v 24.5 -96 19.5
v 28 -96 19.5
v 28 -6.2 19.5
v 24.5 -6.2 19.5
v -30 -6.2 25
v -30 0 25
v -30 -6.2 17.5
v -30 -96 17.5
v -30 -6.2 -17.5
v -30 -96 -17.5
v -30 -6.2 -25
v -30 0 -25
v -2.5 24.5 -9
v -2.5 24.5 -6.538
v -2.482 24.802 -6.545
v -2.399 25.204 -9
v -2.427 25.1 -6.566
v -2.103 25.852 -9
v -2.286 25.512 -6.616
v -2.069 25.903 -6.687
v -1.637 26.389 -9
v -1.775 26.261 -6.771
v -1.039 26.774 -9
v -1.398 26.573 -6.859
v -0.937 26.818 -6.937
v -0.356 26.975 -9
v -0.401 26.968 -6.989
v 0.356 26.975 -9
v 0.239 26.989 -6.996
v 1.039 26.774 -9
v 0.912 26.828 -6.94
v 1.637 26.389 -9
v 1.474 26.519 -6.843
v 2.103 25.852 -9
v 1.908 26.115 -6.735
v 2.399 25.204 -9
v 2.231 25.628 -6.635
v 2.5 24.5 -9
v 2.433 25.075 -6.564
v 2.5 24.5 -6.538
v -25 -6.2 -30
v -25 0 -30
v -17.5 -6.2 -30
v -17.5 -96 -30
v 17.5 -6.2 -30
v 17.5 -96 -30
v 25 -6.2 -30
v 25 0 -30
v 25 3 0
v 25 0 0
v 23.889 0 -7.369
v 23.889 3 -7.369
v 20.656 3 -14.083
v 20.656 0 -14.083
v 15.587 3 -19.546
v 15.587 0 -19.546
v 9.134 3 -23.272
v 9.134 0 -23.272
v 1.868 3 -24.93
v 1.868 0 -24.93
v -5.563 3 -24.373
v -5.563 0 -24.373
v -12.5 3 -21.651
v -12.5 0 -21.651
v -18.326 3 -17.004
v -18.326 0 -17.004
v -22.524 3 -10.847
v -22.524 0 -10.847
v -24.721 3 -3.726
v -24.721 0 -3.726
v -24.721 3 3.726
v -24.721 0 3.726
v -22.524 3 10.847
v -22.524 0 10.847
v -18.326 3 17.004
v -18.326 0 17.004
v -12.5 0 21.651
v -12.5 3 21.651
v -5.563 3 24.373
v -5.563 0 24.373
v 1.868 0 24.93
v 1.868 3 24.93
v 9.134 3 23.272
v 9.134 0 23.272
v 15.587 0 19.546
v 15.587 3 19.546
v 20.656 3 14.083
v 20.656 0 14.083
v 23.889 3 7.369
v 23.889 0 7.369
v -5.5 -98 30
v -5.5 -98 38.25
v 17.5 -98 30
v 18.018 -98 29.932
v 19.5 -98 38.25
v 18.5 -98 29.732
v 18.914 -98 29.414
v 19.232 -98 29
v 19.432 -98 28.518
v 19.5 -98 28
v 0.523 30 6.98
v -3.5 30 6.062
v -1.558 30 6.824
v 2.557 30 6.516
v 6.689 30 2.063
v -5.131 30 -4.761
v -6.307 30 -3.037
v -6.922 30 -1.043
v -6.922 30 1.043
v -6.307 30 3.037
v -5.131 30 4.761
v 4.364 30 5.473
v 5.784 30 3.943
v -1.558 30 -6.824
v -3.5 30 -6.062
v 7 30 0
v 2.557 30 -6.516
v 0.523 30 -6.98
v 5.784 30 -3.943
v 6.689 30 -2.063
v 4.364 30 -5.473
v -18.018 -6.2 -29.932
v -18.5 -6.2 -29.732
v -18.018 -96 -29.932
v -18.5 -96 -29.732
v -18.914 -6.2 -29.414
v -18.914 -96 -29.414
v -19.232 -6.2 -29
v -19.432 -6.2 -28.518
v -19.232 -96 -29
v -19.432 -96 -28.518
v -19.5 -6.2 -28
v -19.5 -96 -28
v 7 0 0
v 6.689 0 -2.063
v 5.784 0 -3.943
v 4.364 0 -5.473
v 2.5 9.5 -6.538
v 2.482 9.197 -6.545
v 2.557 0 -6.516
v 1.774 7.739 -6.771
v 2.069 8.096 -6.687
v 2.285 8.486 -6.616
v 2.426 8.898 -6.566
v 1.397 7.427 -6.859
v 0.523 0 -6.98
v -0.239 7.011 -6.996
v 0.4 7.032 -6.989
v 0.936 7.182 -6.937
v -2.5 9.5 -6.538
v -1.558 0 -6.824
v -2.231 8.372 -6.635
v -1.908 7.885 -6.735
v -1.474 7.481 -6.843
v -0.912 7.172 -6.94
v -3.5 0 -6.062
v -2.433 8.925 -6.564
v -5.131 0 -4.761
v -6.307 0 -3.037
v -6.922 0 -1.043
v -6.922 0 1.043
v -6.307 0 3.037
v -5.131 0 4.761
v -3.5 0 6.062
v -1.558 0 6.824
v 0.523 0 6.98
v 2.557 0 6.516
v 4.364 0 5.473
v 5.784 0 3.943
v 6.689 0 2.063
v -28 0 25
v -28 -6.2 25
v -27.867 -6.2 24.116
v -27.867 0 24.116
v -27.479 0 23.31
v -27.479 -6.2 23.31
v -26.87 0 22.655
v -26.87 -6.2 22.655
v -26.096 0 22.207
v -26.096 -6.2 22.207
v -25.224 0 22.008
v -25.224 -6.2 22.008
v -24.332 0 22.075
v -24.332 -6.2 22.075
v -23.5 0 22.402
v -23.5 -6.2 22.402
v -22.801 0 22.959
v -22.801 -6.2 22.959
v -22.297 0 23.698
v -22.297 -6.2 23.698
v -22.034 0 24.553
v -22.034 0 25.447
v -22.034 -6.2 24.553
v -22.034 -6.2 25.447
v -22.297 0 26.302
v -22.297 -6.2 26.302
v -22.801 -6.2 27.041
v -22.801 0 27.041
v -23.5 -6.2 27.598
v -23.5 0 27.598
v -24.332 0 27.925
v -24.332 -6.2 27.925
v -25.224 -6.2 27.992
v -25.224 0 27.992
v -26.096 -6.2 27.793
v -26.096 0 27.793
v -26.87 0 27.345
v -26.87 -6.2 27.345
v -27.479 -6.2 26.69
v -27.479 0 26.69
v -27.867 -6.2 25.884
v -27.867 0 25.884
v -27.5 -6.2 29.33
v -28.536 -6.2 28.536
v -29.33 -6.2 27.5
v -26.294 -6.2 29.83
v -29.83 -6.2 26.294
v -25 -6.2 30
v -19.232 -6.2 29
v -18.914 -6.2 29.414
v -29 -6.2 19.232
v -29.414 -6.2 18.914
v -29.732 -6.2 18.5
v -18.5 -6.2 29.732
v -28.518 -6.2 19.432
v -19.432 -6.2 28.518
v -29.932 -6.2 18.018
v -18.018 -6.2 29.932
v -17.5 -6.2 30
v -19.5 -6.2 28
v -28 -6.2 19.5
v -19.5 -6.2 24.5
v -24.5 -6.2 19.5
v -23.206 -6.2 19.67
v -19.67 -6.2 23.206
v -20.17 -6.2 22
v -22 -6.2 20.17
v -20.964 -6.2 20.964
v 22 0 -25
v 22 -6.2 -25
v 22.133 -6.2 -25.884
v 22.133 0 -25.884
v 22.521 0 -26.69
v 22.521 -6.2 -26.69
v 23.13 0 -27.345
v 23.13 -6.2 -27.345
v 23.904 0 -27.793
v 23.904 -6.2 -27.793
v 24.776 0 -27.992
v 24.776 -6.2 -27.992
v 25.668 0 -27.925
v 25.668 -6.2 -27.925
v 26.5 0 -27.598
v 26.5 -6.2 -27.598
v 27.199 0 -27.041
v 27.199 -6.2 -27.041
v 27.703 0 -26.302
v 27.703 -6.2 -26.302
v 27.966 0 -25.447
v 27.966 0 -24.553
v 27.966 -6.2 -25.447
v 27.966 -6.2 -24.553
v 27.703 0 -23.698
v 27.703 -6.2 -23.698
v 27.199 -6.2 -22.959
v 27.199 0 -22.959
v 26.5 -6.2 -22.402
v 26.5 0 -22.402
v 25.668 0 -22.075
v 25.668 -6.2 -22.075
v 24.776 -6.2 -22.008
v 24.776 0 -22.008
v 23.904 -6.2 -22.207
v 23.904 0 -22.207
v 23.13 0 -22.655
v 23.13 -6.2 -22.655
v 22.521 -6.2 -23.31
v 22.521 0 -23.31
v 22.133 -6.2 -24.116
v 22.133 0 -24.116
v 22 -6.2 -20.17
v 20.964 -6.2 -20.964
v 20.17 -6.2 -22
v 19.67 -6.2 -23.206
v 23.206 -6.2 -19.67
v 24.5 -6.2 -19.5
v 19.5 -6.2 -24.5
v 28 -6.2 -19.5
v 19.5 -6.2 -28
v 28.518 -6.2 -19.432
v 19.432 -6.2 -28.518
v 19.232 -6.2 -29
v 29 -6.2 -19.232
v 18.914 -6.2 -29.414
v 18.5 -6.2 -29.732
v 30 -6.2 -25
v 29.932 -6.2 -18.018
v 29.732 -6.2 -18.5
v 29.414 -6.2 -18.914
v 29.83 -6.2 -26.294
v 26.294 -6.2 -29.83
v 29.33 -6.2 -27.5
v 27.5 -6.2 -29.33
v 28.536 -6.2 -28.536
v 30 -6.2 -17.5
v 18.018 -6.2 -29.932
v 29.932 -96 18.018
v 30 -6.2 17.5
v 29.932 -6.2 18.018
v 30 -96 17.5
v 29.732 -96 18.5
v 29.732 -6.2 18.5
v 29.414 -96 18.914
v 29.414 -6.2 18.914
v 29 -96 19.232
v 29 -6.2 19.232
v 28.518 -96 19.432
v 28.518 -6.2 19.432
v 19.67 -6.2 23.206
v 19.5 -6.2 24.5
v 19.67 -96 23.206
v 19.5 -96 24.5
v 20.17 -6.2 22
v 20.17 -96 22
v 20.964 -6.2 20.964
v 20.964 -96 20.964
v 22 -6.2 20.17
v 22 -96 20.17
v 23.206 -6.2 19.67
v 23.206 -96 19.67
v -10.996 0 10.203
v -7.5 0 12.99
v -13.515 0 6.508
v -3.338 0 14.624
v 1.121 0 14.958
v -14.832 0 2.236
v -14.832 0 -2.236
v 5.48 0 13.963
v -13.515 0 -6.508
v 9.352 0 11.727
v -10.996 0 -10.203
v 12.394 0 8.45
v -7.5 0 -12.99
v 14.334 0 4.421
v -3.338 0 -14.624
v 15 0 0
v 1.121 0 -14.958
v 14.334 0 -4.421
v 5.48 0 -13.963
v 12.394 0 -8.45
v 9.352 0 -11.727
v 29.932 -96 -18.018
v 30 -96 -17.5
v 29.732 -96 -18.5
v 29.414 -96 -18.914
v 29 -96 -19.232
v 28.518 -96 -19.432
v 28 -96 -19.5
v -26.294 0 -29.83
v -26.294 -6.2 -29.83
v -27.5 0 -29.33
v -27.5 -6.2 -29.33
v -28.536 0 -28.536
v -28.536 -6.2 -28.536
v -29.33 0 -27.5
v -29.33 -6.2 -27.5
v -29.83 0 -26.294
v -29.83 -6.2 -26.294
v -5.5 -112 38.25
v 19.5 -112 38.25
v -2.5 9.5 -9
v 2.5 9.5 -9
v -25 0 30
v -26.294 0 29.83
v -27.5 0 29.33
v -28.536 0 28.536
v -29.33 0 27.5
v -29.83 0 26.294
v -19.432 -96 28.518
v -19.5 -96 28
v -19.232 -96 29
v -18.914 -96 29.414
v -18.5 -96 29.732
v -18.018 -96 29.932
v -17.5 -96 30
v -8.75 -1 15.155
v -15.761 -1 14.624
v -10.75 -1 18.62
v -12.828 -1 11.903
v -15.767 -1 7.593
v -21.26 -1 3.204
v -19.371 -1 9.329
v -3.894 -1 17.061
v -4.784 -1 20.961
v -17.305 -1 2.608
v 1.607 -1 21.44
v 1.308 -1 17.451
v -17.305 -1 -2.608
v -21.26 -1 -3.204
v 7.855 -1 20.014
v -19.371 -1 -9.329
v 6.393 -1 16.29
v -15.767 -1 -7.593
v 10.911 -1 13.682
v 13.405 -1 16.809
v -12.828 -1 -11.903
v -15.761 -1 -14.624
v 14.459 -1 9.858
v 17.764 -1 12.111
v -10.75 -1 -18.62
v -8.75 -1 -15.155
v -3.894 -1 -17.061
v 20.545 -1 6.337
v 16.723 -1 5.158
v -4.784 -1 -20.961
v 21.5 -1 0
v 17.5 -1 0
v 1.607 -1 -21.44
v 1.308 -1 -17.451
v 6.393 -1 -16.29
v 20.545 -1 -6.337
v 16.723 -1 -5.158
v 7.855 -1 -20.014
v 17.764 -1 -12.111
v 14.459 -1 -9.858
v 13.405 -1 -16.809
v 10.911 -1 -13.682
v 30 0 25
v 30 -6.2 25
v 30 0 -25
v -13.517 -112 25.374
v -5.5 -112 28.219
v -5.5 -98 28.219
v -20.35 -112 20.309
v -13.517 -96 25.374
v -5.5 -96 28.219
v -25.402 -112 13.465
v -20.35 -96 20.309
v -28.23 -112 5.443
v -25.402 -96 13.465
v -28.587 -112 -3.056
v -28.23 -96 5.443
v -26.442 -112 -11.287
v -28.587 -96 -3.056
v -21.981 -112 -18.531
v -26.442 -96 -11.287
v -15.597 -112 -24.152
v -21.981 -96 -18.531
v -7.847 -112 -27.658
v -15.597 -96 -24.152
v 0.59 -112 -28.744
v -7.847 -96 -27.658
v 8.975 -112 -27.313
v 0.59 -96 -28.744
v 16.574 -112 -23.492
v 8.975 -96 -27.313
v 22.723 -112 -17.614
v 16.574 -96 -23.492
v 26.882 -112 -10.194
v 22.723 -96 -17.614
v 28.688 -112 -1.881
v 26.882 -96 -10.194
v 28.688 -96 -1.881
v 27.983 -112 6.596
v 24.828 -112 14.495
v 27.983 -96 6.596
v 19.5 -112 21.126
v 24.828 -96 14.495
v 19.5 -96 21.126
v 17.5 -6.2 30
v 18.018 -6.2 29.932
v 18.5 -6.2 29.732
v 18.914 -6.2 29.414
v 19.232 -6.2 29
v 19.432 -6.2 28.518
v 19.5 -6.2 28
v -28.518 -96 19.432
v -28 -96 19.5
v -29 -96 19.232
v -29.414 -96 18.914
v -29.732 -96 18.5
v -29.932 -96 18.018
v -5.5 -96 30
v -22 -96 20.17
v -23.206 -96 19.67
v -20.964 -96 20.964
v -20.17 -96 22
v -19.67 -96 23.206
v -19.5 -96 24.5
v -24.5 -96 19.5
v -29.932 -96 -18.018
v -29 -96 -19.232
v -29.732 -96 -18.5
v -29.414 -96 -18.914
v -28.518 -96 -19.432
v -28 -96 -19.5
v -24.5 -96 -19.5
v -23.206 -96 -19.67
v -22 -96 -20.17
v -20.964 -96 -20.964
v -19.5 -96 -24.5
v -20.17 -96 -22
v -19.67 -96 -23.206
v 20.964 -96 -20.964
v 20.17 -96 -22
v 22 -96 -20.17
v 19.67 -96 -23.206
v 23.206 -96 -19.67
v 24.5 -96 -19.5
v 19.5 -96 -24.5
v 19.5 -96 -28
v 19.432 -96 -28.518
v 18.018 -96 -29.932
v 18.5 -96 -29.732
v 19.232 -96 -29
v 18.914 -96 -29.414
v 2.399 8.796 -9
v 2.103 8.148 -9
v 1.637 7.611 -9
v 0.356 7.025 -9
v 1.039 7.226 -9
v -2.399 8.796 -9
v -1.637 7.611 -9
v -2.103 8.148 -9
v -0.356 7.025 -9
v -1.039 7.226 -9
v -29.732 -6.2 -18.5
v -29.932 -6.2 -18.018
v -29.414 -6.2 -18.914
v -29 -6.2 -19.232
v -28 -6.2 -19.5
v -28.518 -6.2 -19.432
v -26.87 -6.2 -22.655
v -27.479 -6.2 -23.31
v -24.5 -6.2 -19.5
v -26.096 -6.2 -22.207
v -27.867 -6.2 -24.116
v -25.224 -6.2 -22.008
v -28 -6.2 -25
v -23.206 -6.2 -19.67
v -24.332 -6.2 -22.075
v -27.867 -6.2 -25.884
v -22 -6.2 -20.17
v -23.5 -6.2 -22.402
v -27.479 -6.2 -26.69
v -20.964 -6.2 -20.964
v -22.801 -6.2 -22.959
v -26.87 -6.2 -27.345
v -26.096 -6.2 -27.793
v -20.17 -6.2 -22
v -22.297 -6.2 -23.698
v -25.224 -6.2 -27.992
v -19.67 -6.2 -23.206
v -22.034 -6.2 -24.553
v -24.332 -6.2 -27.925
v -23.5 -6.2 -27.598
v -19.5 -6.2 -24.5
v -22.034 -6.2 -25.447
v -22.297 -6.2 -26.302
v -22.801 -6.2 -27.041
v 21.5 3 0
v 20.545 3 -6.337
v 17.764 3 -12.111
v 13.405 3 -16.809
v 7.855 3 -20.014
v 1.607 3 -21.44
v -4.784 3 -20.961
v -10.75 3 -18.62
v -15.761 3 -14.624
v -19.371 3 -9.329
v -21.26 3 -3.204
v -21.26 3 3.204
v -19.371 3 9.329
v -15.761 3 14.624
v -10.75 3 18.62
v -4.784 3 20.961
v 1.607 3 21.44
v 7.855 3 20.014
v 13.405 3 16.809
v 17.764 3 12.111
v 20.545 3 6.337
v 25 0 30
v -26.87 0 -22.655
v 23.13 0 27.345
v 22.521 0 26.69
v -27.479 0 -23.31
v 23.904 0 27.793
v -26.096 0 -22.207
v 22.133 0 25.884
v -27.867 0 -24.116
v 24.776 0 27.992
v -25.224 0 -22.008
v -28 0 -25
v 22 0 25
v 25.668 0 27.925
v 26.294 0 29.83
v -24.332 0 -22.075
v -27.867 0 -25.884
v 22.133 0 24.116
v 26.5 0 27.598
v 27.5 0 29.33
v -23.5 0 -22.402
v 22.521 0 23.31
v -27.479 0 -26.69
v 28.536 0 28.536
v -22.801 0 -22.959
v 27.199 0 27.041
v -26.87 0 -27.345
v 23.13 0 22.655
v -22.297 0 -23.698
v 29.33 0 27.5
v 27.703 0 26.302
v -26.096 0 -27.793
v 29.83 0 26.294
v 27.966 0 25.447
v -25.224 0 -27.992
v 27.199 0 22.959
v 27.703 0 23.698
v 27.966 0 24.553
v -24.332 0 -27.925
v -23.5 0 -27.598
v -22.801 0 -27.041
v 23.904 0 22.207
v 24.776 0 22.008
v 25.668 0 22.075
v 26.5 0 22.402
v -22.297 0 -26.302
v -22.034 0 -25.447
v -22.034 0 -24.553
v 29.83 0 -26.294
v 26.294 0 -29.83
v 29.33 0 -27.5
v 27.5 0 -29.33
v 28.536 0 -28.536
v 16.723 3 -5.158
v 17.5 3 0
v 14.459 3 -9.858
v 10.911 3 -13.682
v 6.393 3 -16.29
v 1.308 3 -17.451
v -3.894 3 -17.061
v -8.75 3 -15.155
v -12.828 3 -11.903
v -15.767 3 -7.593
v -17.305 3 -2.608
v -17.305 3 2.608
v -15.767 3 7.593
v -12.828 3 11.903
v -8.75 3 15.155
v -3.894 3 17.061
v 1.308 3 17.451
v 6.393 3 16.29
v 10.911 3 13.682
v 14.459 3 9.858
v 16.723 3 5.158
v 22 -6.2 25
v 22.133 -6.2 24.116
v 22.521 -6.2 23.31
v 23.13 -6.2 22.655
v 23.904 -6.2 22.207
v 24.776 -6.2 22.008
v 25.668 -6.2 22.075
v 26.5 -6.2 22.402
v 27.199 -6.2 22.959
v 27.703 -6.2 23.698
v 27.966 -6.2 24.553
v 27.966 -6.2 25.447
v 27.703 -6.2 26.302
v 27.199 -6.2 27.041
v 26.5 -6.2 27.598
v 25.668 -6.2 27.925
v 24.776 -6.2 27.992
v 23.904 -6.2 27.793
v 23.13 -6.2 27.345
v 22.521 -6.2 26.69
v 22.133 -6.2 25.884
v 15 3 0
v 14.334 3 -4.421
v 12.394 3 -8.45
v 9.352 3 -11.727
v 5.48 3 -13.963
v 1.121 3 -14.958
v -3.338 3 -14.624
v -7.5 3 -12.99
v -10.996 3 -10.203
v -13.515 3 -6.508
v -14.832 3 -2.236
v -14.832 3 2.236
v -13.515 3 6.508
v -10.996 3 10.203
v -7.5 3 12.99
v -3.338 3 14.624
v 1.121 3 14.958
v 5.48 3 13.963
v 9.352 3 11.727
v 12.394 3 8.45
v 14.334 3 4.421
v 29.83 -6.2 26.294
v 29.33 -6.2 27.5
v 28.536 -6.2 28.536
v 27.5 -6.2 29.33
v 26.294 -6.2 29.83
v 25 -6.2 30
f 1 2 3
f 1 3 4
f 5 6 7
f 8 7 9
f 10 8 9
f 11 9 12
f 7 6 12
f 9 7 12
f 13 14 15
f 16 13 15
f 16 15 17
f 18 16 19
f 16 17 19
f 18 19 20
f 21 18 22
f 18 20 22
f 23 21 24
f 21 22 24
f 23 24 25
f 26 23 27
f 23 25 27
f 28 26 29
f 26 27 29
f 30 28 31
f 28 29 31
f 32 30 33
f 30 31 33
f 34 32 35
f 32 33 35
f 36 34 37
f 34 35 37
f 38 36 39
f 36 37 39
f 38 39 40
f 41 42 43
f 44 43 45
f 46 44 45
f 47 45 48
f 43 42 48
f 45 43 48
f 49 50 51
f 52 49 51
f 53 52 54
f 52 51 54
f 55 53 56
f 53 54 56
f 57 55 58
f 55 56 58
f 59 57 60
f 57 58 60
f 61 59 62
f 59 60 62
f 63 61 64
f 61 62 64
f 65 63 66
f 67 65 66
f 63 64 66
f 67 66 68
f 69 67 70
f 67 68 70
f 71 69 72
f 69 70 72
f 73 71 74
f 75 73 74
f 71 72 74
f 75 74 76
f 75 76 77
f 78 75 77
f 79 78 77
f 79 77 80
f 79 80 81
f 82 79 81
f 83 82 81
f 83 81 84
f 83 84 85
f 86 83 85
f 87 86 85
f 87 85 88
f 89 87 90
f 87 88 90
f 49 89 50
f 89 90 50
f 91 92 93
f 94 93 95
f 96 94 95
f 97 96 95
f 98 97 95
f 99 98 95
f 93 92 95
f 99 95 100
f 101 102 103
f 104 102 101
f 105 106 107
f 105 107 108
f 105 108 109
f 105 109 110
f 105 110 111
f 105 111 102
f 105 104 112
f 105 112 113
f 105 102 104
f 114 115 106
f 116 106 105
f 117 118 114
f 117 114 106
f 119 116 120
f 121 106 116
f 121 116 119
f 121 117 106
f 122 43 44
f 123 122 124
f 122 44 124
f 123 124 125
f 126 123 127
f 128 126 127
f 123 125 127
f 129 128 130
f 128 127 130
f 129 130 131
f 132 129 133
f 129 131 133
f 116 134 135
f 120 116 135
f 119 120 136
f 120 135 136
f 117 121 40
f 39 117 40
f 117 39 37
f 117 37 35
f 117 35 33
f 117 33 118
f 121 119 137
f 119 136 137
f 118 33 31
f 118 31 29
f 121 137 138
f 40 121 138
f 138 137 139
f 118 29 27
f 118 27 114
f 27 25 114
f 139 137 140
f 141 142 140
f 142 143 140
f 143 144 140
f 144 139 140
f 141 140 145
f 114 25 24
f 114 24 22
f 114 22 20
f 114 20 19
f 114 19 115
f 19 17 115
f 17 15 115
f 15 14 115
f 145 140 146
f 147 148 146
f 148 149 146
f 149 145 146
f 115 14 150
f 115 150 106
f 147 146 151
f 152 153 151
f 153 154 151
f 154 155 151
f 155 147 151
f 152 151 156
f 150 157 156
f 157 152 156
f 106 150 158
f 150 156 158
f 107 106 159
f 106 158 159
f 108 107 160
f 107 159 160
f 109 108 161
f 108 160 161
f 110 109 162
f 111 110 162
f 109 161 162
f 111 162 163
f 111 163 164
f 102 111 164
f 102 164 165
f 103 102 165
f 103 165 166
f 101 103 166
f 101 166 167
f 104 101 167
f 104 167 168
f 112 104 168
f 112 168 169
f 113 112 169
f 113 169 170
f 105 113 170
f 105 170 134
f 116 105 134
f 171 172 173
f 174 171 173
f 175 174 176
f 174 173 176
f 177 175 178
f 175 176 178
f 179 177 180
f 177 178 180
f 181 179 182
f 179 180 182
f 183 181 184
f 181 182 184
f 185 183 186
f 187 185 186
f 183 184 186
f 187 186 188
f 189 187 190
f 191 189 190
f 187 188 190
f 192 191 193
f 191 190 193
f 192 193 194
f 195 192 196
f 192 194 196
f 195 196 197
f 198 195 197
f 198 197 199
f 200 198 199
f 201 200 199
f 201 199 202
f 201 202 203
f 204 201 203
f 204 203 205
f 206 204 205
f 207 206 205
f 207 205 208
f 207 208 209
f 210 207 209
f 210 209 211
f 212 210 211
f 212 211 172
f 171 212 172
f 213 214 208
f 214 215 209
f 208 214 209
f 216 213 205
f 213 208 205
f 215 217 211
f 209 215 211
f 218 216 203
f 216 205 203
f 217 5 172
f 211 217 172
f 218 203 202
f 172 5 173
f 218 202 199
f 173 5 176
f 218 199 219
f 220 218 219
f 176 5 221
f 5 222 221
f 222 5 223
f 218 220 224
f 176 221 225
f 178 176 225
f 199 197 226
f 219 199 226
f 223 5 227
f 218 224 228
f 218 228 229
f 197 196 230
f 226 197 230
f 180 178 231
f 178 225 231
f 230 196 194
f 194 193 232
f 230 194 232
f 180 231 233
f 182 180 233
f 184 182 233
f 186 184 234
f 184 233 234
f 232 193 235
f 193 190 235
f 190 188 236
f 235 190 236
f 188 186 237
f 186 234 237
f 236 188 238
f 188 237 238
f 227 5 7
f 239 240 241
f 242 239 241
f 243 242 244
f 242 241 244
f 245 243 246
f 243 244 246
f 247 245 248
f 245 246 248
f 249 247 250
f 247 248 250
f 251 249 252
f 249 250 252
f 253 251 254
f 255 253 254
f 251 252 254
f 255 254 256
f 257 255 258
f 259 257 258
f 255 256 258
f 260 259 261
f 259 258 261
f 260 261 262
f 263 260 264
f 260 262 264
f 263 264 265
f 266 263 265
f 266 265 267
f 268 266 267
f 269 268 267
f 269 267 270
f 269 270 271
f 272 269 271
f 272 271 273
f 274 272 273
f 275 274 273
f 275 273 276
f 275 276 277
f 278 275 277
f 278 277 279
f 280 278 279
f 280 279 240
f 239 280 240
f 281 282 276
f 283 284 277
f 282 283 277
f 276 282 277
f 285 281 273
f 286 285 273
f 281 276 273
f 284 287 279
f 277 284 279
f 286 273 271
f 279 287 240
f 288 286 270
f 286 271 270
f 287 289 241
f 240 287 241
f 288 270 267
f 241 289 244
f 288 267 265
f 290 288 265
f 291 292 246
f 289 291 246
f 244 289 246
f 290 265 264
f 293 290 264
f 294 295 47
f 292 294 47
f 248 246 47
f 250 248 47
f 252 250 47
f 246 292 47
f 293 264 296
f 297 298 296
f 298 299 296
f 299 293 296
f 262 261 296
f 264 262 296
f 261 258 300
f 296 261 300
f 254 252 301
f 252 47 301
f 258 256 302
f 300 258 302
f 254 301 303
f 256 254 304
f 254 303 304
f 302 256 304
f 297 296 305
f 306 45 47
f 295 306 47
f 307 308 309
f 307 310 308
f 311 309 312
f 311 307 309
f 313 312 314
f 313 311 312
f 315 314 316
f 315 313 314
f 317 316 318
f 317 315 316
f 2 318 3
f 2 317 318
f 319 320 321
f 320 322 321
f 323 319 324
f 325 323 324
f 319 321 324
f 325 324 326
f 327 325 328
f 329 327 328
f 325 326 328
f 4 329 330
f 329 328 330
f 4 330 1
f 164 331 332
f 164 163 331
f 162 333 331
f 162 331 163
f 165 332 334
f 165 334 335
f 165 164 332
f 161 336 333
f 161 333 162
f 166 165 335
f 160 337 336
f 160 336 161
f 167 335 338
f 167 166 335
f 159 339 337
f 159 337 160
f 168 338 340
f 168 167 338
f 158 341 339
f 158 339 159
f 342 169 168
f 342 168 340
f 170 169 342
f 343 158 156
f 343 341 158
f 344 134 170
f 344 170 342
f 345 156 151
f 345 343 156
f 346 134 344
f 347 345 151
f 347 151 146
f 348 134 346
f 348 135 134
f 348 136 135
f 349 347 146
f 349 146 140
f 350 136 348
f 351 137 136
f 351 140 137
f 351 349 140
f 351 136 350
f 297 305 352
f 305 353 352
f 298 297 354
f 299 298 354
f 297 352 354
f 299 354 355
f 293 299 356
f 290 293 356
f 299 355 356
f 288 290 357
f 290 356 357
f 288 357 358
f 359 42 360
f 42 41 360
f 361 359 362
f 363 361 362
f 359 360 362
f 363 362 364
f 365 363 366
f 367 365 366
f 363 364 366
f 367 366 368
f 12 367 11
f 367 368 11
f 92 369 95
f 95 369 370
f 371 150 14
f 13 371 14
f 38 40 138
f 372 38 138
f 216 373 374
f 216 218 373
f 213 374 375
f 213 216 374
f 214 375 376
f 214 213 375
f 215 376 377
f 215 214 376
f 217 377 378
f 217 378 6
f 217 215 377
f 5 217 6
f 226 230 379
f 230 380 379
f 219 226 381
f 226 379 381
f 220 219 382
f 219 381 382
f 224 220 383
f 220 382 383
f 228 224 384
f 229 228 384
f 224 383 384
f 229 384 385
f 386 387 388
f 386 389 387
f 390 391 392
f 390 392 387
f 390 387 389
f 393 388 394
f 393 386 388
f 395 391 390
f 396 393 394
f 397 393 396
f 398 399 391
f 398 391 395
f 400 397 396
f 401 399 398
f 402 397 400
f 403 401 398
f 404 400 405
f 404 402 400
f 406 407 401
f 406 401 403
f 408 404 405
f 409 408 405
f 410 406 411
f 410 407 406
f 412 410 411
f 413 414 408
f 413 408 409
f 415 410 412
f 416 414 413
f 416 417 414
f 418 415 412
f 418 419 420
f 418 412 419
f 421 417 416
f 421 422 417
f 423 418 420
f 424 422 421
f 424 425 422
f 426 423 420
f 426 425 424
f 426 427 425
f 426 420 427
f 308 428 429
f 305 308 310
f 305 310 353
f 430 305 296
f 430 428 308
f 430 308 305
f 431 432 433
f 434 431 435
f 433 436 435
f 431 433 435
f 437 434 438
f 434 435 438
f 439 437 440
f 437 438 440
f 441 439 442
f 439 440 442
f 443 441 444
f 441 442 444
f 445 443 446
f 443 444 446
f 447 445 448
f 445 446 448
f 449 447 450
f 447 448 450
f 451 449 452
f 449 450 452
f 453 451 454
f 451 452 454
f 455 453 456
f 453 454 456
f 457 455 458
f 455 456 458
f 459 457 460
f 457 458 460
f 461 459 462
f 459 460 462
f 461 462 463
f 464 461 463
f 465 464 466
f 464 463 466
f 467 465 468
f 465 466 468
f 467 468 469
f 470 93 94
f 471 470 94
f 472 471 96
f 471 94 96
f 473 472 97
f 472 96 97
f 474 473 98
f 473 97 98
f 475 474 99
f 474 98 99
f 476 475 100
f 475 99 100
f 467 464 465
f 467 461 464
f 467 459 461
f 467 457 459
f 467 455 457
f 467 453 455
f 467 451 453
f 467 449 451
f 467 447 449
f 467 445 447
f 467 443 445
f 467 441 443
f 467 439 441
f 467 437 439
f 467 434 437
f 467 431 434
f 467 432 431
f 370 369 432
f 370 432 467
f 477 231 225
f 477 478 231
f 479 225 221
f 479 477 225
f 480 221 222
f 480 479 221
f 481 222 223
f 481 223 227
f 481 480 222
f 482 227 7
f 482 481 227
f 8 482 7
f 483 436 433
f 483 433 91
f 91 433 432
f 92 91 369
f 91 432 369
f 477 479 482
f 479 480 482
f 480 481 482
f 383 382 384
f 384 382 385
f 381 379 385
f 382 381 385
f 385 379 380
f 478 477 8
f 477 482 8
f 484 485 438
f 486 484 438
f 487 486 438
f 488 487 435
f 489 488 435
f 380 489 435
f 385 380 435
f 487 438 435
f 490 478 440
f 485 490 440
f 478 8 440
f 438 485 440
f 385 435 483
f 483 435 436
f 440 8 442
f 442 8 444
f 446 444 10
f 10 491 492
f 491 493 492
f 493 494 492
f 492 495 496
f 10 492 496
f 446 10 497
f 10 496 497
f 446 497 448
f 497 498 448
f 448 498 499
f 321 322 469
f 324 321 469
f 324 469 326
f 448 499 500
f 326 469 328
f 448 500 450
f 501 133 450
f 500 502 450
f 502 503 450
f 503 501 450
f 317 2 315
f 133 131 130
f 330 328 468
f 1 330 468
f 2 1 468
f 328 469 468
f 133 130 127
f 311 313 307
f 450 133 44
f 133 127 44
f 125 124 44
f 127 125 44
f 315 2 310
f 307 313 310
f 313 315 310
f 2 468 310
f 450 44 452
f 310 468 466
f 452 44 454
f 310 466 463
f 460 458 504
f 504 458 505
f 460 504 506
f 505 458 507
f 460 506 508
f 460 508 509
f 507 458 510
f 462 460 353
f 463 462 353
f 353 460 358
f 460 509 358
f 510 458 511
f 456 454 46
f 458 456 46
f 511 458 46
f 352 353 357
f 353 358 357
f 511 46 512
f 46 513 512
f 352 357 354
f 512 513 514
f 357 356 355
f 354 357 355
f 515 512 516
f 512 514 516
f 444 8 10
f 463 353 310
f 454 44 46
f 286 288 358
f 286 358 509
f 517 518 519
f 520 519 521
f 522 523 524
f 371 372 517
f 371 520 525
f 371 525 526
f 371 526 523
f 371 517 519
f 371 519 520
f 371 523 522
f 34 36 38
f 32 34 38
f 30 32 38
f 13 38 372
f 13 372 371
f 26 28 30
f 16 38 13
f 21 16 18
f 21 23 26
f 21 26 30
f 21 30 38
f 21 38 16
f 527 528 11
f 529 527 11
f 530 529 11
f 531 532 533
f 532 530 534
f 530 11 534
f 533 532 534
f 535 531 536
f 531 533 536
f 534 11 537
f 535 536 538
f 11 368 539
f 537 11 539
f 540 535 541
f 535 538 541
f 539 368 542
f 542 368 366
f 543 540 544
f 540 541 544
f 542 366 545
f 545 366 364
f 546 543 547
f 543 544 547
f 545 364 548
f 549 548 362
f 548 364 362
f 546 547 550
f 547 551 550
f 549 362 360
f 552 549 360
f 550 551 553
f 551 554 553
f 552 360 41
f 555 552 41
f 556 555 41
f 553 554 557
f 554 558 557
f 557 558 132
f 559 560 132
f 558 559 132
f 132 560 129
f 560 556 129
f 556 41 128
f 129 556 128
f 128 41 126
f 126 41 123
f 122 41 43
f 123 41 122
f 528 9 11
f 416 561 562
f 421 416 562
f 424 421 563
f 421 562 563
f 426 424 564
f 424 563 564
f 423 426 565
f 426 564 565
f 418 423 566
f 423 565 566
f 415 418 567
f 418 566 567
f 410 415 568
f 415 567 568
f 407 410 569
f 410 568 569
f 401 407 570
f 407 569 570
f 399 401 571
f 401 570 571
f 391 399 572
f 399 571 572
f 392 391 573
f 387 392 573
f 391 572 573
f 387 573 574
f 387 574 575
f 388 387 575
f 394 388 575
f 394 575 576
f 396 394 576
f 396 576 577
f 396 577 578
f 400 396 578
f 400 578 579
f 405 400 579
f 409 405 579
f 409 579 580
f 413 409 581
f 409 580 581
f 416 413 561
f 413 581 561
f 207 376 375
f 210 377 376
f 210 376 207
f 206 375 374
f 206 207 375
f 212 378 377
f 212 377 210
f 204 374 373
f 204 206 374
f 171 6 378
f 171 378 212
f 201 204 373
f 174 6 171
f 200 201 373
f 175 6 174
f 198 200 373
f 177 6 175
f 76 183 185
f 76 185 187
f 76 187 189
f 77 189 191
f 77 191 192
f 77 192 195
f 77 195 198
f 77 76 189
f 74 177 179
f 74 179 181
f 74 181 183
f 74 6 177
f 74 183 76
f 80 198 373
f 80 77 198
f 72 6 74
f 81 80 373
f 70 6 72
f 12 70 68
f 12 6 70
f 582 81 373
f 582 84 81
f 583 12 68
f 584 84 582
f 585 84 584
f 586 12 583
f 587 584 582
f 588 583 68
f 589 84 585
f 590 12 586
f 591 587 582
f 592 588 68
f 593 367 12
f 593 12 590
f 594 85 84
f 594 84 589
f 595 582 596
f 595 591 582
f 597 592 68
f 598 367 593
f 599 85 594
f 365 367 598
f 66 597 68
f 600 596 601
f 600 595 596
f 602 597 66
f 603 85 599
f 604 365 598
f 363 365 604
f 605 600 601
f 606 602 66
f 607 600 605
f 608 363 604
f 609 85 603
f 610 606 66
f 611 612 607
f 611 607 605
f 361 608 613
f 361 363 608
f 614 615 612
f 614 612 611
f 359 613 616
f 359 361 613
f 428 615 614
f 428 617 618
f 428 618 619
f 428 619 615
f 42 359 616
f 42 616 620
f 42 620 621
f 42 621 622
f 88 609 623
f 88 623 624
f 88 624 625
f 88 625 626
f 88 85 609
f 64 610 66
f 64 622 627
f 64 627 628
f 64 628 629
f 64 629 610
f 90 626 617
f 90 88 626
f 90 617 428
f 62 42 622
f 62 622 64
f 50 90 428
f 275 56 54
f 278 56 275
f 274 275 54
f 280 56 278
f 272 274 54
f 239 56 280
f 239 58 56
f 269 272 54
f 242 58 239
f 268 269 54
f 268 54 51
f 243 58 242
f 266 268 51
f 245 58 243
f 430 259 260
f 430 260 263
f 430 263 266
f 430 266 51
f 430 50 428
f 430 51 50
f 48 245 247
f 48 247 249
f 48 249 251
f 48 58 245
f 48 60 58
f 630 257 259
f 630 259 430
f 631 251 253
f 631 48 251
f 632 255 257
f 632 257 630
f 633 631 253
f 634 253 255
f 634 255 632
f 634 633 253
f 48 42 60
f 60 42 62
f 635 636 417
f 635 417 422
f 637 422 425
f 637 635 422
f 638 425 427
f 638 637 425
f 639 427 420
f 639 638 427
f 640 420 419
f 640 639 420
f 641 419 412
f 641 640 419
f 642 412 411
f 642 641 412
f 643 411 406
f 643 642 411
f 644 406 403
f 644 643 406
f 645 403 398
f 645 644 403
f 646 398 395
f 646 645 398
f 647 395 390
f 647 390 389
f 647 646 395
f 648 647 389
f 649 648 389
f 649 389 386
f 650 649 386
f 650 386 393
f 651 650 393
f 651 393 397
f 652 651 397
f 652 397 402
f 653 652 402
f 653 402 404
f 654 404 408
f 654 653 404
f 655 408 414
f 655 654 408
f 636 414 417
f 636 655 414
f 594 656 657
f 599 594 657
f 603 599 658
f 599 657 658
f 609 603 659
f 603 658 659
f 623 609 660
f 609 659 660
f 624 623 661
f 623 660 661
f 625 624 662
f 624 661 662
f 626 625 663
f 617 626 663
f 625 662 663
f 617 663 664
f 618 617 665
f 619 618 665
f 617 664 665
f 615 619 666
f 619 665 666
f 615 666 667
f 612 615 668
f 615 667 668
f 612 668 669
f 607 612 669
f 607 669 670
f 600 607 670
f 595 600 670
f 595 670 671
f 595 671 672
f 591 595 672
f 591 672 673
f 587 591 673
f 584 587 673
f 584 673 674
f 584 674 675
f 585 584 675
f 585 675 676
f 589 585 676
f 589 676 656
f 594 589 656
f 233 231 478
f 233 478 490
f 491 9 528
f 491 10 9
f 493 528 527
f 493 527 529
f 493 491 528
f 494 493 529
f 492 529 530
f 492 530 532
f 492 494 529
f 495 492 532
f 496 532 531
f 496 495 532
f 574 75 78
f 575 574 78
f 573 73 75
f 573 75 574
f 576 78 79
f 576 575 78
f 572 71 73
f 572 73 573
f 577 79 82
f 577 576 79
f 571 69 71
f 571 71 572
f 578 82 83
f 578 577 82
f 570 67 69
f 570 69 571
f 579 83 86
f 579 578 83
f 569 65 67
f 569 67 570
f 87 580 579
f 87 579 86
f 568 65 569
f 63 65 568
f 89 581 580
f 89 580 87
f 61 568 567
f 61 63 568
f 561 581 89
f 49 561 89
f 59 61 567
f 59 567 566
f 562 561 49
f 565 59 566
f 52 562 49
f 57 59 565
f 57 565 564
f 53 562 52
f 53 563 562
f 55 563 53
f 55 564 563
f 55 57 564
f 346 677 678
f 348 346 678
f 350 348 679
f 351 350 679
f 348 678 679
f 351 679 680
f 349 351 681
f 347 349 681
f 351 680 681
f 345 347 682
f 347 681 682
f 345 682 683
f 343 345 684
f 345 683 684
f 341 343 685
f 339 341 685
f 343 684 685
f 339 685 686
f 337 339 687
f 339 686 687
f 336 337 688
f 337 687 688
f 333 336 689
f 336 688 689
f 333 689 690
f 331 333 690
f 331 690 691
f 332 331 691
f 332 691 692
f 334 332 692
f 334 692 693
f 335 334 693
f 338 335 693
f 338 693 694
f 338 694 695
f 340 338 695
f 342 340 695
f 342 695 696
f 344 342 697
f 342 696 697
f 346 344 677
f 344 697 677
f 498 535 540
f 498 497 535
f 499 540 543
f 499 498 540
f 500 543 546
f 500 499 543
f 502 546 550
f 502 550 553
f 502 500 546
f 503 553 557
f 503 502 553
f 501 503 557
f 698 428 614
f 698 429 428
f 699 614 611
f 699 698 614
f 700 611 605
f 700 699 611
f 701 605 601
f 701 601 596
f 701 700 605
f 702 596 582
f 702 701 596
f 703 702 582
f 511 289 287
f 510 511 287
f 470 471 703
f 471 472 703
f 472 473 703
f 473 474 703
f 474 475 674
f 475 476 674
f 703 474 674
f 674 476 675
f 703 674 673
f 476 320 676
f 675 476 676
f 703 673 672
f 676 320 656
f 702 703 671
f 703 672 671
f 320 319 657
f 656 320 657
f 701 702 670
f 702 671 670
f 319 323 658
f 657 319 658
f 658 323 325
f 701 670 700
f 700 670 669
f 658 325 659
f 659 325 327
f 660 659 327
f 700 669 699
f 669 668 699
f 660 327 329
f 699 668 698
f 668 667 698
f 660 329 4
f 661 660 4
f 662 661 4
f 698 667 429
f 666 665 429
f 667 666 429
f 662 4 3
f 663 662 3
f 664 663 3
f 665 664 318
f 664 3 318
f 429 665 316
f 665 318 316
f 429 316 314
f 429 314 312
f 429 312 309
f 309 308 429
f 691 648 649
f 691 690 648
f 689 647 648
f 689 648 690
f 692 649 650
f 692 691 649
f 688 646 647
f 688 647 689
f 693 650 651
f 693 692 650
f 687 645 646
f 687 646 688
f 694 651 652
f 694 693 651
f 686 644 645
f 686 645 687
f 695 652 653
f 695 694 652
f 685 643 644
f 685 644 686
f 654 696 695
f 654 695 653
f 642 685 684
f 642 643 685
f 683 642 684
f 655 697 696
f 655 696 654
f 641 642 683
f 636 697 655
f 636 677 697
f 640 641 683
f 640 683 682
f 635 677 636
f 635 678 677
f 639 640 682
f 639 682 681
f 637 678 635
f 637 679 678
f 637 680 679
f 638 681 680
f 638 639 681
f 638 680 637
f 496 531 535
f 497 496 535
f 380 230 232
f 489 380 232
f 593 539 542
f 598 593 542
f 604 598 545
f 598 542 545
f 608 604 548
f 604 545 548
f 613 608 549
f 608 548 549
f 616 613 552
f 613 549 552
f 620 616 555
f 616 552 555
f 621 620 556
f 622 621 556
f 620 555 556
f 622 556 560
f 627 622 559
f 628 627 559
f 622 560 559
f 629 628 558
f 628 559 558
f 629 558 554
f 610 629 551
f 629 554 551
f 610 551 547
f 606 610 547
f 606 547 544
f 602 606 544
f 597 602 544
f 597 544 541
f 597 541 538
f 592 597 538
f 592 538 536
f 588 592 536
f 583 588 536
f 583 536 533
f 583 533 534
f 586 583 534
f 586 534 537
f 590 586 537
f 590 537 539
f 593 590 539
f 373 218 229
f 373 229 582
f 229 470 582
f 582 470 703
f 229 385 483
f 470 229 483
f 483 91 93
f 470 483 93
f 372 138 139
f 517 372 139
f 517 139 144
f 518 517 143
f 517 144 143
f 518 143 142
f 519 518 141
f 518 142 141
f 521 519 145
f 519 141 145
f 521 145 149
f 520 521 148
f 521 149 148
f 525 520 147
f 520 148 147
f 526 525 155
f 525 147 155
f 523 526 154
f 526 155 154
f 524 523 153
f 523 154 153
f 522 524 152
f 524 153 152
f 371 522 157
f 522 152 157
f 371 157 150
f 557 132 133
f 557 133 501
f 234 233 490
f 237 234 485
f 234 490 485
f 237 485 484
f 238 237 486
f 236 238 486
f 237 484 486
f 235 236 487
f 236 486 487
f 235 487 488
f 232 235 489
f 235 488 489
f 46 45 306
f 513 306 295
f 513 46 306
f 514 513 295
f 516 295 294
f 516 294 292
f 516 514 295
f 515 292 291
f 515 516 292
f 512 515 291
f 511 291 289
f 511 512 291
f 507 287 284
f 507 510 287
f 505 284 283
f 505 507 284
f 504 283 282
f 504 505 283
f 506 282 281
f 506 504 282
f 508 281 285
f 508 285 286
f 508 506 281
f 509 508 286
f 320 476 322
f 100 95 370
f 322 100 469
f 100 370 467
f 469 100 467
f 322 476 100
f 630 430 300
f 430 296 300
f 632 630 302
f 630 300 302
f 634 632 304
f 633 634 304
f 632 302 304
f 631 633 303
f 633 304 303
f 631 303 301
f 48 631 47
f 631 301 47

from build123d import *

# Parameters (mm, degrees)
SKETCH_2_W               = 60
SKETCH_2_H               = 60
EXTRUDE_1_DEPTH          = 96
SKETCH_3_W               = 10.5
SKETCH_3_H               = 10.5
CUT_EXTRUDE_1_DEPTH      = 97
PATTERN_CIRCULAR_1_COUNT = 4
SKETCH_4_W               = 60
SKETCH_4_H               = 60
EXTRUDE_2_DEPTH          = 6.2
SKETCH_5_R               = 25
EXTRUDE_3_DEPTH          = 3
SKETCH_8_R               = 21.5
SKETCH_8_R_2             = 17.5
CUT_EXTRUDE_3_DEPTH      = 4
SKETCH_9_R               = 15
CUT_EXTRUDE_4_DEPTH      = 3
SKETCH_10_R              = 7
EXTRUDE_5_DEPTH          = 30
FILLET_1_R               = 5
FILLET_2_R               = 2
FILLET_3_R               = 5
SKETCH_13_R              = 28.75
EXTRUDE_6_DEPTH          = 16
EXTRUDE_START            = 16
SKETCH_14_W              = 25
SKETCH_14_H              = 17.123890562
EXTRUDE_7_DEPTH          = 14
EXTRUDE_8_DEPTH          = 2
HOLE_WIZARD_6_0_6_1_D    = 6
CUT_EXTRUDE_5_DEPTH      = 3
EXTRUDE_9_DEPTH          = 5


with BuildPart() as part:
    # Sketch 2 → Extrude 1 (new body)
    with BuildSketch(Plane(origin=(0, 0, 0), x_dir=(1, 0, 0), z_dir=(0, 1, 0))):
        Rectangle(SKETCH_2_W, SKETCH_2_H)
    extrude(amount=-EXTRUDE_1_DEPTH)

    # Sketch 3 → Cut-Extrude 1 (cut, through all)
    with BuildSketch(Plane(origin=(0, 0, 0), x_dir=(1, 0, 0), z_dir=(0, 1, 0))):
        with Locations((-24.75, -24.75)):
            Rectangle(SKETCH_3_W, SKETCH_3_H)
    cut_extrude_1 = extrude(amount=-CUT_EXTRUDE_1_DEPTH, mode=Mode.SUBTRACT)

    # Pattern Circular 1: Cut-Extrude 1 ×4 about axis
    pattern_circular_1_axis = Axis((0, 0, 0), (0, 1, 0))
    for i in range(1, PATTERN_CIRCULAR_1_COUNT):
        add(cut_extrude_1.rotate(pattern_circular_1_axis, i * 360 / PATTERN_CIRCULAR_1_COUNT), mode=Mode.SUBTRACT)

    # Sketch 4 → Extrude 2 (add)
    with BuildSketch(Plane(origin=(0, 0, 0), x_dir=(1, 0, 0), z_dir=(0, 1, 0))):
        Rectangle(SKETCH_4_W, SKETCH_4_H)
    extrude(amount=-EXTRUDE_2_DEPTH)

    # Sketch 5 → Extrude 3 (add)
    with BuildSketch(Plane(origin=(0, 0, 0), x_dir=(1, 0, 0), z_dir=(0, 1, 0))):
        Circle(SKETCH_5_R)
    extrude(amount=EXTRUDE_3_DEPTH)

    # Sketch 8 → Cut-Extrude 3 (cut)
    with BuildSketch(Plane(origin=(0, 3, 0), x_dir=(1, 0, 0), z_dir=(0, 1, 0))):
        Circle(SKETCH_8_R)
        Circle(SKETCH_8_R_2, mode=Mode.SUBTRACT)
    extrude(amount=-CUT_EXTRUDE_3_DEPTH, mode=Mode.SUBTRACT)

    # Sketch 9 → Cut-Extrude 4 (cut)
    with BuildSketch(Plane(origin=(0, 3, 0), x_dir=(1, 0, 0), z_dir=(0, 1, 0))):
        Circle(SKETCH_9_R)
    extrude(amount=-CUT_EXTRUDE_4_DEPTH, mode=Mode.SUBTRACT)

    # Sketch 10 → Extrude 5 (add)
    with BuildSketch(Plane(origin=(0, 0, 0), x_dir=(1, 0, 0), z_dir=(0, 1, 0))):
        Circle(SKETCH_10_R)
    extrude(amount=EXTRUDE_5_DEPTH)

    # Fillet 1
    fillet_1_edges = [part.edges().sort_by_distance(p)[0] for p in [
        (-19.5, -51.1, 19.5),
        (-19.5, -51.1, -19.5),
        (19.5, -51.1, -19.5),
        (19.5, -51.1, 19.5),
    ]]
    fillet(fillet_1_edges, radius=FILLET_1_R)

    # Fillet 2
    fillet_2_edges = [part.edges().sort_by_distance(p)[0] for p in [
        (-30, -51.1, 19.5),
        (-19.5, -51.1, 30),
        (-19.5, -51.1, -30),
        (-30, -51.1, -19.5),
        (30, -51.1, -19.5),
        (19.5, -51.1, -30),
        (19.5, -51.1, 30),
        (30, -51.1, 19.5),
    ]]
    fillet(fillet_2_edges, radius=FILLET_2_R)

    # Fillet 3
    fillet_3_edges = [part.edges().sort_by_distance(p)[0] for p in [
        (30, -3.1, 30),
        (30, -3.1, -30),
        (-30, -3.1, -30),
        (-30, -3.1, 30),
    ]]
    fillet(fillet_3_edges, radius=FILLET_3_R)

    # Sketch 13 → Extrude 6 (add)
    with BuildSketch(Plane.XZ.offset(96)):
        Circle(SKETCH_13_R)
    extrude(amount=EXTRUDE_6_DEPTH)

    # Sketch 14 → Extrude 7 (add)
    with BuildSketch(Plane.XZ.offset(96).offset(EXTRUDE_START)):
        with Locations((7, 29.688054719)):
            Rectangle(SKETCH_14_W, SKETCH_14_H)
    extrude(amount=-EXTRUDE_7_DEPTH)

    # Sketch 15 → Extrude 8 (add)
    with BuildSketch(Plane(origin=(0, -98, 0), x_dir=(1, 0, 0), z_dir=(0, 1, 0))):
        with BuildLine():
            Line((-5.5, -30), (17.5, -30))
            ThreePointArc((17.5, -30), (18.914213562, -29.414213562), (19.5, -28))
            Line((19.5, -28), (19.5, -21.126109438))
            ThreePointArc((19.5, -21.126109438), (7.847121001, -27.658365678), (-5.5, -28.21900955))
            Line((-5.5, -28.21900955), (-5.5, -30))
        make_face()
    extrude(amount=EXTRUDE_8_DEPTH)

    # Hole Wizard 6.0 _6_ _1 (through all)
    with Locations(Plane(origin=(0, 0, 0), x_dir=(1, 0, 0), z_dir=(0, 1, 0))):
        with Locations((-25, 25), (25, 25), (25, -25), (-25, -25)):
            Hole(HOLE_WIZARD_6_0_6_1_D / 2)

    # Sketch 20 → Cut-Extrude 5 (cut)
    with BuildSketch(Plane.XY.offset(-7)):
        with BuildLine():
            Line((-2.5, 24.5), (-2.5, 9.5))
            ThreePointArc((-2.5, 9.5), (0, 7), (2.5, 9.5))
            Line((2.5, 9.5), (2.5, 24.5))
            ThreePointArc((2.5, 24.5), (0, 27), (-2.5, 24.5))
        make_face()
    extrude(amount=CUT_EXTRUDE_5_DEPTH, mode=Mode.SUBTRACT)

    # Sketch 21 → Extrude 9 (add)
    with BuildSketch(Plane(origin=(0, 0, -4), x_dir=(-1, 0, 0), z_dir=(0, 0, -1))):
        with BuildLine():
            Line((2.5, 9.5), (2.5, 24.5))
            ThreePointArc((2.5, 24.5), (0, 27), (-2.5, 24.5))
            Line((-2.5, 24.5), (-2.5, 9.5))
            ThreePointArc((-2.5, 9.5), (0, 7), (2.5, 9.5))
        make_face()
    extrude(amount=EXTRUDE_9_DEPTH)


solid = part.part
